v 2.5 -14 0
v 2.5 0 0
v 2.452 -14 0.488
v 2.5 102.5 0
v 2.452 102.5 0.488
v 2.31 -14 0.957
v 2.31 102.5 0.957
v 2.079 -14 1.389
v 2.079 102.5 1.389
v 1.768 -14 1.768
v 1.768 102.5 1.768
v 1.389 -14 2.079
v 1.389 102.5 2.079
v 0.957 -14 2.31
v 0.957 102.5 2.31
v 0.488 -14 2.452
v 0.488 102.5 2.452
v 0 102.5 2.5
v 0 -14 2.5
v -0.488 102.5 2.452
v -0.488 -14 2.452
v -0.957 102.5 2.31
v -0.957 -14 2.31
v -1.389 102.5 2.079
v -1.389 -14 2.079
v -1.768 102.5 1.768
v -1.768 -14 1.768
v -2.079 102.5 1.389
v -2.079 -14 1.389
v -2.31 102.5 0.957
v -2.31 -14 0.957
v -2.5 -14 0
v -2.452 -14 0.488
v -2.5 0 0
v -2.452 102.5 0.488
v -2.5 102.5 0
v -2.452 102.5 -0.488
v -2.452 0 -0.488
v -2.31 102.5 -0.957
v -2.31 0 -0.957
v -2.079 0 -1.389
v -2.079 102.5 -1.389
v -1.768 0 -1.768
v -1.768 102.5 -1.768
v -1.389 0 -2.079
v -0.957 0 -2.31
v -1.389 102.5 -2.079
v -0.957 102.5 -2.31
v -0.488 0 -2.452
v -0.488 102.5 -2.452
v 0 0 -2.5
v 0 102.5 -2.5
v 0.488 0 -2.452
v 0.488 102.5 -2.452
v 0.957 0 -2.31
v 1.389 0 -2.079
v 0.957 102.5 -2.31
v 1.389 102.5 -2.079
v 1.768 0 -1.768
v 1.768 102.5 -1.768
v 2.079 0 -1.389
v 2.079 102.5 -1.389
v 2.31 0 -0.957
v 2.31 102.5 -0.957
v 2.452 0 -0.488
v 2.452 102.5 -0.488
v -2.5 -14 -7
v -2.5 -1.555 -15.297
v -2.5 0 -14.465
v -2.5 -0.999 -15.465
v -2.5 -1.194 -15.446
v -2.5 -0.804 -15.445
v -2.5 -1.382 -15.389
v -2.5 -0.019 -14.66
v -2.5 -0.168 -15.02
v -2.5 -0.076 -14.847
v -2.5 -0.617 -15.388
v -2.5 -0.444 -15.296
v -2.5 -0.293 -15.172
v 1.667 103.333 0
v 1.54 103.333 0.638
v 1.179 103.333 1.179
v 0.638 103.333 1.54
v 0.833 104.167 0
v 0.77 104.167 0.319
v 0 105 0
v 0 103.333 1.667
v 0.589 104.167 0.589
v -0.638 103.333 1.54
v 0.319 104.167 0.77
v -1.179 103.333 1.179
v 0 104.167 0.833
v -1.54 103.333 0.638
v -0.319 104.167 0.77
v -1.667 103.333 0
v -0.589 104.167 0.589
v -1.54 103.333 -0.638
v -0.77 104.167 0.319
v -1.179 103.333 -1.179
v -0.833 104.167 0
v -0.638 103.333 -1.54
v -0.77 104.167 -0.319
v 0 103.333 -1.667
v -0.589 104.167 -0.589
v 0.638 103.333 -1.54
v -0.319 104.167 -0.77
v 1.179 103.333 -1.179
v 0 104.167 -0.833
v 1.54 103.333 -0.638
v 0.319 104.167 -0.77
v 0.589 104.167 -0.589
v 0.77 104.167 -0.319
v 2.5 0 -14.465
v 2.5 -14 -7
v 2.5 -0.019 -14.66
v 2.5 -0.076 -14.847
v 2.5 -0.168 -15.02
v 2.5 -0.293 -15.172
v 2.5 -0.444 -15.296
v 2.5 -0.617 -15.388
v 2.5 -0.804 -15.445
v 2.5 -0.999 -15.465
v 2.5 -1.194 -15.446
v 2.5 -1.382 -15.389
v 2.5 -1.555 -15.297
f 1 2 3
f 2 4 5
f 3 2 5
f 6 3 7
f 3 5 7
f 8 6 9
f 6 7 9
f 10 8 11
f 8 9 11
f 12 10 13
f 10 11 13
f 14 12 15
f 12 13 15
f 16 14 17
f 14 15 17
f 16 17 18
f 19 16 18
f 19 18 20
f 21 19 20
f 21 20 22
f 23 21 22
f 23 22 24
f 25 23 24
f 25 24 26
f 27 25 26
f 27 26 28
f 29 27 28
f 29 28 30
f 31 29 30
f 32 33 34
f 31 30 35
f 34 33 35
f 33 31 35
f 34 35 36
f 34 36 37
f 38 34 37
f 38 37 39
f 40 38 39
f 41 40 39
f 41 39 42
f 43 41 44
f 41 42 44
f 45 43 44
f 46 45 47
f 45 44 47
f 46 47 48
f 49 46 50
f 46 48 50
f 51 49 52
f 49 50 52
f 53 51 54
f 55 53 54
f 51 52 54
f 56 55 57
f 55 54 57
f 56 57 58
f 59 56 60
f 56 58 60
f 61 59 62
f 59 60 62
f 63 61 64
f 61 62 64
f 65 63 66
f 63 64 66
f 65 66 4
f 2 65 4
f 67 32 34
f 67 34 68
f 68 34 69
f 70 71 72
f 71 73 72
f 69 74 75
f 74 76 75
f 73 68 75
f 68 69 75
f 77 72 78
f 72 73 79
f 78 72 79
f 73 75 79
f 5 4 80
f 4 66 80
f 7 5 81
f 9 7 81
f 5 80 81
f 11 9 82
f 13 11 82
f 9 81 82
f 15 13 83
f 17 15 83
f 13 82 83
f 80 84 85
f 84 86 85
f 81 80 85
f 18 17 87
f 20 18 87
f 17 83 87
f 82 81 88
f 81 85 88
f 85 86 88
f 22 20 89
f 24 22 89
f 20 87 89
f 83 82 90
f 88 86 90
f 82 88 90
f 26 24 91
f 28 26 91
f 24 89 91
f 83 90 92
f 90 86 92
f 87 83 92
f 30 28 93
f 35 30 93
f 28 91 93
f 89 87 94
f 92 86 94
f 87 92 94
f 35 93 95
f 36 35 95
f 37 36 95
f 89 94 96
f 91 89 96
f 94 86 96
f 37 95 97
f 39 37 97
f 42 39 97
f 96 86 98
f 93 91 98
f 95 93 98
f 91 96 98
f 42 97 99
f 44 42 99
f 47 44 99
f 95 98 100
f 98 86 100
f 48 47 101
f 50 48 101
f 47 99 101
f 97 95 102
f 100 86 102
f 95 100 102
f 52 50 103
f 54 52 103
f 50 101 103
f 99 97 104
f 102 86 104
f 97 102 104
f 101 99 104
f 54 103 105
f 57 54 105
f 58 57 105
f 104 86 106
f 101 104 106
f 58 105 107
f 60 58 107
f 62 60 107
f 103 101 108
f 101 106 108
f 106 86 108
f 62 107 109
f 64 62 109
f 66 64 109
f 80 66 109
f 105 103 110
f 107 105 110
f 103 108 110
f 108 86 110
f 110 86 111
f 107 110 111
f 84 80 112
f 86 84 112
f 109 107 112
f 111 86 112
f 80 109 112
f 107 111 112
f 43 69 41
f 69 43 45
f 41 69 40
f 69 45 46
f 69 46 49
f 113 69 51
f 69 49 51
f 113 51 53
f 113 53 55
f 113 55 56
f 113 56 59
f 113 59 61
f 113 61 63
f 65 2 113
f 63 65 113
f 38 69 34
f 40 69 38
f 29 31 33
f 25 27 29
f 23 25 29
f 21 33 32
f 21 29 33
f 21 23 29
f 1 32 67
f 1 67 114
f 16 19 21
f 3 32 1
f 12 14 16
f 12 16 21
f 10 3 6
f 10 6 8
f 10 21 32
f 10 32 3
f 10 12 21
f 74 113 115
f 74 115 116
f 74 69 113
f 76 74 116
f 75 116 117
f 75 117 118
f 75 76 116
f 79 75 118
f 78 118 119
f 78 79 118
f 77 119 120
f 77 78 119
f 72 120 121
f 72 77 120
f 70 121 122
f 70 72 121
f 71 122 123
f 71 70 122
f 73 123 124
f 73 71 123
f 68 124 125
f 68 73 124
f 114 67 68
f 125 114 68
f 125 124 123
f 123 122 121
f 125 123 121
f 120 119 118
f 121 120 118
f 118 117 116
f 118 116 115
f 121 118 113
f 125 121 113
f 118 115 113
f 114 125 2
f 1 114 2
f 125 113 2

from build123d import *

# Parameters (mm, degrees)
F0_R        = 2.5
F1_DEPTH    = 105
F3_DEPTH    = 14
F4_SIZE     = 2.5
F5_T1_DEPTH = 82.5140157162
F6_R        = 1


# Not quite as in the source:
# - a fillet or chamfer that OpenCascade refuses, or shapes differently, is made with other operations: its cross-section is extruded or revolved along the edge and cut away or added


with BuildPart() as f1:
    # F0 (on Front) → F1 (new body)
    with BuildSketch(Plane.XZ):
        Circle(F0_R)
    extrude(amount=-F1_DEPTH)

    # F2 (on face) → F3 (join)
    with BuildSketch(Plane.XZ):
        with BuildLine():
            Line((-2.5, 0), (-2.5, -17))
            Line((-2.5, -17), (2.5, -17))
            Line((2.5, -17), (2.5, 0))
            ThreePointArc((2.5, 0), (0, -2.5), (-2.5, 0))
        make_face()
        with BuildLine():
            ThreePointArc((2.5, 0), (0, 2.5), (-2.5, 0))
            ThreePointArc((-2.5, 0), (0, -2.5), (2.5, 0))
        make_face()
    extrude(amount=F3_DEPTH)

    # F4
    f4_edges = [f1.edges().sort_by_distance(p)[0] for p in [
        (-2.5, 105, 0),
    ]]
    chamfer(f4_edges, length=F4_SIZE)

    # F5: chamfer of 10 x 15 on 1 edges, made by hand

    # F5_s2 → F5_t1 (cut)
    with BuildSketch(Plane.YZ.offset(-41.2570078581)):
        Polygon((-14, -7), (1, -17), (-14, -17), align=None)
    extrude(amount=F5_T1_DEPTH, mode=Mode.SUBTRACT)

    # F6
    f6_edges = [f1.edges().sort_by_distance(p)[0] for p in [
        (0, 0, -16.333333),
    ]]
    fillet(f6_edges, radius=F6_R)


solid = f1.part
